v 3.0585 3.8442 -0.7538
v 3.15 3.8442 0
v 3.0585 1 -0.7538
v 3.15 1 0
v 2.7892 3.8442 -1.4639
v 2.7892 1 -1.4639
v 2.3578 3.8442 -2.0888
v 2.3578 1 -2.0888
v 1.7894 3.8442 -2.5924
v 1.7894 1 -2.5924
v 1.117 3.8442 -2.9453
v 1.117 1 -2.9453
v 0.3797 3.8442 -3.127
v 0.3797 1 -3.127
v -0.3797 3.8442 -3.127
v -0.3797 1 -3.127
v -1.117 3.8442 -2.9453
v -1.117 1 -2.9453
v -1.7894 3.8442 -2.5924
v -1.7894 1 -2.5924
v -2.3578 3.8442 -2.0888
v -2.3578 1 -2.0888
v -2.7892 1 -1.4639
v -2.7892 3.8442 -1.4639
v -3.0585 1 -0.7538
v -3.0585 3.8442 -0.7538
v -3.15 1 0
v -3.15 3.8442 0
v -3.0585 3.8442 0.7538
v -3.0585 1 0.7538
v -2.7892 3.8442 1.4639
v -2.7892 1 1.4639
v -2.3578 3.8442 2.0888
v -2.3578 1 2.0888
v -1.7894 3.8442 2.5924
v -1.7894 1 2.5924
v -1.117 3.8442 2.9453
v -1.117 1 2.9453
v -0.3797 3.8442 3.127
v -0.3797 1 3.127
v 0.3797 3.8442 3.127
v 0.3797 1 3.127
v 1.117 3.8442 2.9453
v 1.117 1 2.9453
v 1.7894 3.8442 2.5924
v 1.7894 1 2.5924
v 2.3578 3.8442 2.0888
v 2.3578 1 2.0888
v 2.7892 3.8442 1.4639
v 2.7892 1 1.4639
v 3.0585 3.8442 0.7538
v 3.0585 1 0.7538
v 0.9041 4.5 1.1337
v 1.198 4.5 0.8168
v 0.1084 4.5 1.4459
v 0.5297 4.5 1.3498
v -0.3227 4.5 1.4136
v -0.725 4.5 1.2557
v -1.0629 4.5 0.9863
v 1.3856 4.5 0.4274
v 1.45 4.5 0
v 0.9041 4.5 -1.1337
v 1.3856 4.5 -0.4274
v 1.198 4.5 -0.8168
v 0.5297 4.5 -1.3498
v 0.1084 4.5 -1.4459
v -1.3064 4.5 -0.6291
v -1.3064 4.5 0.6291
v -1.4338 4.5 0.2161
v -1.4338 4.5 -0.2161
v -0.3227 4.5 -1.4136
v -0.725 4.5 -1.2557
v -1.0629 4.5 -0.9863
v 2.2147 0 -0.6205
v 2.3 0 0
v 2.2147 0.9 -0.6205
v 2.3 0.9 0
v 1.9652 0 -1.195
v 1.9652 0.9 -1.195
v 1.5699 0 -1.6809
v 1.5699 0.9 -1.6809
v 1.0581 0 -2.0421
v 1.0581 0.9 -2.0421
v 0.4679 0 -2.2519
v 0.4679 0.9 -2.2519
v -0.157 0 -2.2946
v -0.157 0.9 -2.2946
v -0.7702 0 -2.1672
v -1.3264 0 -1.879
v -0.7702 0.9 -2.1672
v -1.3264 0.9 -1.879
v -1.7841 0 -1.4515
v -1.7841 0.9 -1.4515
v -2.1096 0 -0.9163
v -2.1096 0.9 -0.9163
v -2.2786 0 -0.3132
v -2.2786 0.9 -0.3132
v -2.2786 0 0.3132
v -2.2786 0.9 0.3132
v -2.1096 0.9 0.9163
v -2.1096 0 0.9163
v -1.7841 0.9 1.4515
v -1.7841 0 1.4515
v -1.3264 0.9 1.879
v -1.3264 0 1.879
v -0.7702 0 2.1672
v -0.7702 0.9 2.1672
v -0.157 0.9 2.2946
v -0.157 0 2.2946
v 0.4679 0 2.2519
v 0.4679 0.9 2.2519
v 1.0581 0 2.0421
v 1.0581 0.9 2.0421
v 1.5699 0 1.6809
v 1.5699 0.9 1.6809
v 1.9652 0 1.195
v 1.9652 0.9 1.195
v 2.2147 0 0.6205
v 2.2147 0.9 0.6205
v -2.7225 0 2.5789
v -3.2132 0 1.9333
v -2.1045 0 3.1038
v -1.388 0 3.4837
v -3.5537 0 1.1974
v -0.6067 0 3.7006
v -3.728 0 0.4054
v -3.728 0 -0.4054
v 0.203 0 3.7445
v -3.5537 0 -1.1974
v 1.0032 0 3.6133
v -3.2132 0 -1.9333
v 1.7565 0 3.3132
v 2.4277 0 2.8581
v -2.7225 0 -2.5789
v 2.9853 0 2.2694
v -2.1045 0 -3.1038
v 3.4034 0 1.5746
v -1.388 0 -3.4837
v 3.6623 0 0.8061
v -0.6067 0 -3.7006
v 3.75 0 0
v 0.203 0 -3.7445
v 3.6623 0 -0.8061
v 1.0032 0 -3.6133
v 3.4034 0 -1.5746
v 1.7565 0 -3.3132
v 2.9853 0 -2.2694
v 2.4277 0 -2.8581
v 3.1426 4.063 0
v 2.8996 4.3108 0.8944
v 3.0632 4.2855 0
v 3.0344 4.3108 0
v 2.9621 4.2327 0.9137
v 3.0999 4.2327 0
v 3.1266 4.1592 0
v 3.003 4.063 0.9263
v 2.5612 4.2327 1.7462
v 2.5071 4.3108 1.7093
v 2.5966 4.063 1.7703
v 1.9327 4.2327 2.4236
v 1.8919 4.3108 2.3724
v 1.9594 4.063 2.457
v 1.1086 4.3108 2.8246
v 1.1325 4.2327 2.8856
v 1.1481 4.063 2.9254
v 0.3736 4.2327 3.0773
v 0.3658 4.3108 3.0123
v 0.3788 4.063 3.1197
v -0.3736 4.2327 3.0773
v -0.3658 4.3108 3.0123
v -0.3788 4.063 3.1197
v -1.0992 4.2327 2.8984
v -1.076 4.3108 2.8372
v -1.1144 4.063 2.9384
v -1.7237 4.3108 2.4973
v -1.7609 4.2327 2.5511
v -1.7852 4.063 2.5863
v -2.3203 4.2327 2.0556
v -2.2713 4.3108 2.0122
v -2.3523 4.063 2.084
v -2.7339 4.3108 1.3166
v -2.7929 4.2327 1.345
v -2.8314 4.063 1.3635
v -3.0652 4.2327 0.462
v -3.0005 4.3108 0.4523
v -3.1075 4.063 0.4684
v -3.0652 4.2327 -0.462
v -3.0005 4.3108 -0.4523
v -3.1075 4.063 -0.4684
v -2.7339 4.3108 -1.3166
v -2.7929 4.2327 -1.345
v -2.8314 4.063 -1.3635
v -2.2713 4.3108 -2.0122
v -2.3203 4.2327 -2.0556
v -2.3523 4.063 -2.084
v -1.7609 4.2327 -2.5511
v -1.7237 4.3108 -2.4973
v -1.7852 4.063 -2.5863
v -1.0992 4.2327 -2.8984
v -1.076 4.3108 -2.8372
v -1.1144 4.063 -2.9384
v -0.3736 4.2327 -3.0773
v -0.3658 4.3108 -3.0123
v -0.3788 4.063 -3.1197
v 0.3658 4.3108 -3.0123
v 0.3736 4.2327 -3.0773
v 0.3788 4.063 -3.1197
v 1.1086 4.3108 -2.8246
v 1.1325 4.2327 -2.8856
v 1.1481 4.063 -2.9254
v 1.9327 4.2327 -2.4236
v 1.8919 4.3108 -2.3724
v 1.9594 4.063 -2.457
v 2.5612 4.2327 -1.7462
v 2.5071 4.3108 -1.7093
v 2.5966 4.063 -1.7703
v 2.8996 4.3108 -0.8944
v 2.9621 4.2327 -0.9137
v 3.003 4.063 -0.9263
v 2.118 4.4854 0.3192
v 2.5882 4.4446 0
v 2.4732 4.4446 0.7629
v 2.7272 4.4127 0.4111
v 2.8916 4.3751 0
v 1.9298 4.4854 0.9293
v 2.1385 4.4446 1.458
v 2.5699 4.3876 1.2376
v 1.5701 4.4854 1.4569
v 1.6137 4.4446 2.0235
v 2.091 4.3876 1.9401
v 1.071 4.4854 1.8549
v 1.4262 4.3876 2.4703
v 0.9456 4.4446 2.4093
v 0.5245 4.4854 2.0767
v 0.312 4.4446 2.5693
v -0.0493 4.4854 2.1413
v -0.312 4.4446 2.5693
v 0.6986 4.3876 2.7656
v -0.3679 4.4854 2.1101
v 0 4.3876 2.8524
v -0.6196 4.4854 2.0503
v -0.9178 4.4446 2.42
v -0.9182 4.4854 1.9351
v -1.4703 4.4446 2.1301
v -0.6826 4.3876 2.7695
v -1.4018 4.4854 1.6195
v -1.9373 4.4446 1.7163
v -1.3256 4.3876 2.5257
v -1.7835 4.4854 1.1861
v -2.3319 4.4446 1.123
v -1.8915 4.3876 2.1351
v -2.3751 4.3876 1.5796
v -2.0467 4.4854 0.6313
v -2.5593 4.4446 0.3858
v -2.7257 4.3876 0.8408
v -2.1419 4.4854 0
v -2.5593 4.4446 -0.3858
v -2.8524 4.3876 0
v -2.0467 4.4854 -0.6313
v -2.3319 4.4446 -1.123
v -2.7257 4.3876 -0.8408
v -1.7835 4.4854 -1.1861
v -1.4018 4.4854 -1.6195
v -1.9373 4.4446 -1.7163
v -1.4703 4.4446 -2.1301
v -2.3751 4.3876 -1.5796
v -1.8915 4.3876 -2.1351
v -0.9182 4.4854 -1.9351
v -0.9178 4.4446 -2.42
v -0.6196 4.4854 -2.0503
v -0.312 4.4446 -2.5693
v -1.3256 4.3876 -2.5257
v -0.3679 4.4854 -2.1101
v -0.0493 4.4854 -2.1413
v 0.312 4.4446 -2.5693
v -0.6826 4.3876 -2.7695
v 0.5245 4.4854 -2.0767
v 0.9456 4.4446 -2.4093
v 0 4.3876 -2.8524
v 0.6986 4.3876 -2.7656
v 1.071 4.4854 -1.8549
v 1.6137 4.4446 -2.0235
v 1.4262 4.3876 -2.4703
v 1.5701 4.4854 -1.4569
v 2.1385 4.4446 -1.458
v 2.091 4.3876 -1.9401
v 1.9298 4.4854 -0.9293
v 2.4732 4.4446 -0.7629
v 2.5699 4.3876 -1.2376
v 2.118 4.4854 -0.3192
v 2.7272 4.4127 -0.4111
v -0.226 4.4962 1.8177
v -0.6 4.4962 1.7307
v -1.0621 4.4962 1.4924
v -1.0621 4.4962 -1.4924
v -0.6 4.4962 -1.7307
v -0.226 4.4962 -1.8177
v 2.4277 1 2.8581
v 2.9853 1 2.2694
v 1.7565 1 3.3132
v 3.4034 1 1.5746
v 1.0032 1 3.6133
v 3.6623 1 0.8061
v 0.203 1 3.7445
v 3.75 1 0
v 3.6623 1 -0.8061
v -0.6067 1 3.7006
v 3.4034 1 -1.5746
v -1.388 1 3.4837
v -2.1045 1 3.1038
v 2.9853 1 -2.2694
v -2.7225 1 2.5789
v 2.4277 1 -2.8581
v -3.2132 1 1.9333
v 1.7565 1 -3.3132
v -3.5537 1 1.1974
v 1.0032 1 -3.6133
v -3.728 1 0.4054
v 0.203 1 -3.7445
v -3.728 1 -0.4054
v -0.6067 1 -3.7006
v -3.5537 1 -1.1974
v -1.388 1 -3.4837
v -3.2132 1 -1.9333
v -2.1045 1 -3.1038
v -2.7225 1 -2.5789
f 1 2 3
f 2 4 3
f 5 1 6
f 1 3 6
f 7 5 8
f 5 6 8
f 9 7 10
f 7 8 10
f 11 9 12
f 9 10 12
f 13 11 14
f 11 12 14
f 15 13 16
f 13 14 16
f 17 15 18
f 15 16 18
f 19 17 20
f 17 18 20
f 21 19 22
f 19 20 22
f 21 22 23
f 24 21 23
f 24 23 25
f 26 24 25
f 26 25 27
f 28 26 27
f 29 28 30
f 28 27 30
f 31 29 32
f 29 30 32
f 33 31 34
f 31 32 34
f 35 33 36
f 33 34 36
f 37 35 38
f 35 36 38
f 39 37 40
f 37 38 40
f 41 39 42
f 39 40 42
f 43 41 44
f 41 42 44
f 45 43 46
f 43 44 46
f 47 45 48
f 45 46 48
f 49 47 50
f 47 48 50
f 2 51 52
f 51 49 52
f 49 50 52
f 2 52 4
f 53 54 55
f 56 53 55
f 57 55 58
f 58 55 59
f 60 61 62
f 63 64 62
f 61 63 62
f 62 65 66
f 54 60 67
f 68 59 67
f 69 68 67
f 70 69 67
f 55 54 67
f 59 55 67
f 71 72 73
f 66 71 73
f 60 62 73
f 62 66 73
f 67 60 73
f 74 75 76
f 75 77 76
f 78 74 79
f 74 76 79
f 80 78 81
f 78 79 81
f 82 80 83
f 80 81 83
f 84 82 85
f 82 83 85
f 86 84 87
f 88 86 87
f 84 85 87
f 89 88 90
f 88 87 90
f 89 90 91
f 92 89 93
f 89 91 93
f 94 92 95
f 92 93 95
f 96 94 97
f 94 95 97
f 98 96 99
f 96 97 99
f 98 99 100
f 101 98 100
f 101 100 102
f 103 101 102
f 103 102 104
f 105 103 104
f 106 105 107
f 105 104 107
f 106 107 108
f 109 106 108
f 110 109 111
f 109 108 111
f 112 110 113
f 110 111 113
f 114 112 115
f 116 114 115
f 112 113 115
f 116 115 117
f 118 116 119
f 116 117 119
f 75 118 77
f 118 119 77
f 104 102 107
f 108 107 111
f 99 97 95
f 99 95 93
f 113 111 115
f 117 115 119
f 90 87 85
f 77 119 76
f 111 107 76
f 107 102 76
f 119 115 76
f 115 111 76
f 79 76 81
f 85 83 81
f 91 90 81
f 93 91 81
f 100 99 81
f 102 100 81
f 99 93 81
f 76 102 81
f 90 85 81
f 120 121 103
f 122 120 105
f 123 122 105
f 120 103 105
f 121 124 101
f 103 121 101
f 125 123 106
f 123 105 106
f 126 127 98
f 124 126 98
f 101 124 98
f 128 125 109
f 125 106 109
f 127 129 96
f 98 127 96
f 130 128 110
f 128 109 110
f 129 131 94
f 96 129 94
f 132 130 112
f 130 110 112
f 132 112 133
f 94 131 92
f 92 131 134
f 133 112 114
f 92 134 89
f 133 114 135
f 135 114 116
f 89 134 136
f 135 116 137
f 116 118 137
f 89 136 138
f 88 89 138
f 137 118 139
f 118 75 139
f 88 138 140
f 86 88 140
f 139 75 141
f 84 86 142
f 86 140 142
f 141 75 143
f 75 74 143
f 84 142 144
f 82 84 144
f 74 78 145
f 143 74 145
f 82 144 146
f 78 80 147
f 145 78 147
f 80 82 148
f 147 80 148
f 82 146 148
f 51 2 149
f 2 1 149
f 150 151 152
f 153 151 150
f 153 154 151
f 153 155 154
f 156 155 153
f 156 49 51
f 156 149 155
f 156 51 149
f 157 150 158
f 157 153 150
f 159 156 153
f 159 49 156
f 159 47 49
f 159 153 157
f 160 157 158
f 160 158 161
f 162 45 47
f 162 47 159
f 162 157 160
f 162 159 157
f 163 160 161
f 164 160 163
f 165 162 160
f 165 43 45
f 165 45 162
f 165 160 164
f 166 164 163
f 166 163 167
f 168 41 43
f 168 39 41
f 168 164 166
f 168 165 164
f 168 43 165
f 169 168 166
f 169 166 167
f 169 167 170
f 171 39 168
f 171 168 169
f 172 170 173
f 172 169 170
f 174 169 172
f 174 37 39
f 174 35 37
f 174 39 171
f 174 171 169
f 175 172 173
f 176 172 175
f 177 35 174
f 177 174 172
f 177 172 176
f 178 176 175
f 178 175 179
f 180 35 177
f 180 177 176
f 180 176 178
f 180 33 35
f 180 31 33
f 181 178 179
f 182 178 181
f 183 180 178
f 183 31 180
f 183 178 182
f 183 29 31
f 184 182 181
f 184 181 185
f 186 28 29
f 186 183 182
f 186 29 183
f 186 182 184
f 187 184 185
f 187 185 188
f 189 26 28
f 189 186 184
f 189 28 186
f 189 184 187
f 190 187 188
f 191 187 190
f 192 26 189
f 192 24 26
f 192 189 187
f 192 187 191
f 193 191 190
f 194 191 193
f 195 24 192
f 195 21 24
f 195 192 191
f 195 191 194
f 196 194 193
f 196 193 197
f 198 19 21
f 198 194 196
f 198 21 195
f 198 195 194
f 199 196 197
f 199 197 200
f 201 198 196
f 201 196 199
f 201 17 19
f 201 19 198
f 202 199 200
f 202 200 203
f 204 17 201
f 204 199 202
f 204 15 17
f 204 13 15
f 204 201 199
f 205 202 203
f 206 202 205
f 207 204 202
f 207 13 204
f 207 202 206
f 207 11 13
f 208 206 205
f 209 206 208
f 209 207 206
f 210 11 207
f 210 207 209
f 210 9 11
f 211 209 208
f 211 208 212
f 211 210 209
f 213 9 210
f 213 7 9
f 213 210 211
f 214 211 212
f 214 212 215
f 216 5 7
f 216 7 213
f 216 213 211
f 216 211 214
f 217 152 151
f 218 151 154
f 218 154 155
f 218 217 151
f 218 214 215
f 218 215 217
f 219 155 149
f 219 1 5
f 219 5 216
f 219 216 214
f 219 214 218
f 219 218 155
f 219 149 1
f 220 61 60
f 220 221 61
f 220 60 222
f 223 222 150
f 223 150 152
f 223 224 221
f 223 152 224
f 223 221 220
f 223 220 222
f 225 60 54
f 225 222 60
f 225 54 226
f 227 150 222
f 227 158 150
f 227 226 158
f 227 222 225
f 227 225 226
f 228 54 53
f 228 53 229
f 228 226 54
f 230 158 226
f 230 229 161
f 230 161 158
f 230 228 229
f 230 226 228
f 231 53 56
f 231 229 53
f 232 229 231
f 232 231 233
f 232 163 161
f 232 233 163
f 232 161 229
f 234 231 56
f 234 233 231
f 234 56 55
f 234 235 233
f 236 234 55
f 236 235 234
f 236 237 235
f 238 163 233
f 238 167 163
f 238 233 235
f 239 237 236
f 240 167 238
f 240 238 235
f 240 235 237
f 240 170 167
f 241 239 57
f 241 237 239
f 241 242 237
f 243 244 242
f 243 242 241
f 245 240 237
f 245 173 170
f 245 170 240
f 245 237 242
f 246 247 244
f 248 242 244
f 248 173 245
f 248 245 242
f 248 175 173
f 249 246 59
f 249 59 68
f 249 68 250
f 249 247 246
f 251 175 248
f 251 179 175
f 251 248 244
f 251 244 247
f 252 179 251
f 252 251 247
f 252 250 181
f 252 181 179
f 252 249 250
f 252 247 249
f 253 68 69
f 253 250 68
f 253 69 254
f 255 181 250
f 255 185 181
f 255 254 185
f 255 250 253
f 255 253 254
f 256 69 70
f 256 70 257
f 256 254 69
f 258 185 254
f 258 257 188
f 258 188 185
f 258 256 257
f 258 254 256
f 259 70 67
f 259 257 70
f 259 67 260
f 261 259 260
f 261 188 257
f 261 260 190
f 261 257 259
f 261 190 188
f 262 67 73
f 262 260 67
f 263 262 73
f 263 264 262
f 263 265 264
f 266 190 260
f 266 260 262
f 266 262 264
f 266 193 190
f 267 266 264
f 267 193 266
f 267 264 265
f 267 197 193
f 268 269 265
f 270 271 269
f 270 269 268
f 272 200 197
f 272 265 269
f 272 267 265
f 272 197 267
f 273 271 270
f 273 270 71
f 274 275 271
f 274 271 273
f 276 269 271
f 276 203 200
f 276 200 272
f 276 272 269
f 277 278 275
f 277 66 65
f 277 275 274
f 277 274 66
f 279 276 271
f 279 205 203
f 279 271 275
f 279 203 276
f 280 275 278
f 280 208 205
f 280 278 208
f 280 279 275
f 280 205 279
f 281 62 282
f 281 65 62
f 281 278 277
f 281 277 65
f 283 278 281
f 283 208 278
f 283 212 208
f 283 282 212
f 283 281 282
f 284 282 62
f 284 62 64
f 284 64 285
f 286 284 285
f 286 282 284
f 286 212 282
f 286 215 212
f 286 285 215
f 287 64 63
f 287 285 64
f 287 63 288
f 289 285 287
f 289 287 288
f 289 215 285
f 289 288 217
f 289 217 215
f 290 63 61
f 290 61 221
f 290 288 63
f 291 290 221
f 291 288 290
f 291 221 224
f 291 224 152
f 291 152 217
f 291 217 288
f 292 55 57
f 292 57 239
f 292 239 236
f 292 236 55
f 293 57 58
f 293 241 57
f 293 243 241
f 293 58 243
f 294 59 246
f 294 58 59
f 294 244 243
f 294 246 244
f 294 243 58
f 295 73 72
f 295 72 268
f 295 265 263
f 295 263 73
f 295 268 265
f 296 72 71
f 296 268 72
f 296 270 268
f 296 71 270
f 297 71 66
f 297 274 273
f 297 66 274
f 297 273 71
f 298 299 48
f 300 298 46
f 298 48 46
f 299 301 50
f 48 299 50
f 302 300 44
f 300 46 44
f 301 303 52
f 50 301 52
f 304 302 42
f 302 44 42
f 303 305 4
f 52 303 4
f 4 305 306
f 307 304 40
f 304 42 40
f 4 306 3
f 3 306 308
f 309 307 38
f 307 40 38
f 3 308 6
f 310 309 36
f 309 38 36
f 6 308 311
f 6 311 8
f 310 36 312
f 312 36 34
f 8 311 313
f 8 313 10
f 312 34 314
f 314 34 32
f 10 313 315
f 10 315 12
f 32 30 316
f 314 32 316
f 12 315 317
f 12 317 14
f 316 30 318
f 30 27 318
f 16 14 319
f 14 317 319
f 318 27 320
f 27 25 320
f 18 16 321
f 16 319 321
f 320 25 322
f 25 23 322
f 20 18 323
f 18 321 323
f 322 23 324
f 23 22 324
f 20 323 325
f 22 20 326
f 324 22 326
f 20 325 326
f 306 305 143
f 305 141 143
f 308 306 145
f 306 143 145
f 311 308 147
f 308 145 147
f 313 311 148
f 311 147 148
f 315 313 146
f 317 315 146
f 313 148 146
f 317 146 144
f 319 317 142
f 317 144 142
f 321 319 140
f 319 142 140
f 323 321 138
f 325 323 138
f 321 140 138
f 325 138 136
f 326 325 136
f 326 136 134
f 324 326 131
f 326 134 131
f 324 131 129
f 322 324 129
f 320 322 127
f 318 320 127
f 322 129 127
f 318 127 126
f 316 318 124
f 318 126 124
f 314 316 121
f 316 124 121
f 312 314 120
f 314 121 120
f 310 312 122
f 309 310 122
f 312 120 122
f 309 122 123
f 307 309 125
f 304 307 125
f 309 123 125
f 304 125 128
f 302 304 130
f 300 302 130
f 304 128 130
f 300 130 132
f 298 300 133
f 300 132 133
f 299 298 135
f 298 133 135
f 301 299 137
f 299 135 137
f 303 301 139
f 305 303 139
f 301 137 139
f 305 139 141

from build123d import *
from OCP.BRepAlgoAPI import BRepAlgoAPI_Cut
from OCP.TopTools import TopTools_ListOfShape


with BuildPart() as part:
    # 草图1 → 旋转1 (revolve)
    with BuildSketch(Plane.XY):
        Polygon((2.3, 0), (2.3, 0.9), (0, 0.9), (0, 4.5), (3.15, 4.5), (3.15, 1), (3.75, 1), (3.75, 0), align=None)
    revolve(axis=Axis((0, 0.9, 0), (0, 1, 0)))


with BuildPart() as cut_revolve_6_tool:
    # 草图2 → 切除-旋转6 (revolve)
    with BuildSketch(Plane.XY):
        with BuildLine():
            Line((1.45, 4.5), (3.15, 4.5))
            Line((3.15, 4.5), (3.15, 3.8))
            add(Edge.make_bspline(
                [(1.45, 4.5), (2.373616695, 4.5), (2.769590277, 4.433977798), (3.153202517, 4.267640833), (3.15, 4.025903219), (3.15, 3.8)],
                knots=[0, 0, 0, 0, 0.535445213, 0.635445213, 1, 1, 1, 1], degree=3))
        make_face()
    revolve(axis=Axis((0, 4.5, 0), (0, -1, 0)))


with BuildPart() as part_1:
    add(part.part)

    # 切除-旋转6: cut by cut_revolve_6_tool, with a tolerance
    cut_revolve_6_stock = TopTools_ListOfShape()
    cut_revolve_6_stock.Append(part_1.part.wrapped)
    cut_revolve_6_tools = TopTools_ListOfShape()
    cut_revolve_6_tools.Append(cut_revolve_6_tool.part.wrapped)
    cut_revolve_6_cut = BRepAlgoAPI_Cut()
    cut_revolve_6_cut.SetArguments(cut_revolve_6_stock)
    cut_revolve_6_cut.SetTools(cut_revolve_6_tools)
    cut_revolve_6_cut.SetFuzzyValue(0.00001)
    cut_revolve_6_cut.Build()
    add(Compound.cast(cut_revolve_6_cut.Shape()).solids(), mode=Mode.REPLACE)


solid = part_1.part
